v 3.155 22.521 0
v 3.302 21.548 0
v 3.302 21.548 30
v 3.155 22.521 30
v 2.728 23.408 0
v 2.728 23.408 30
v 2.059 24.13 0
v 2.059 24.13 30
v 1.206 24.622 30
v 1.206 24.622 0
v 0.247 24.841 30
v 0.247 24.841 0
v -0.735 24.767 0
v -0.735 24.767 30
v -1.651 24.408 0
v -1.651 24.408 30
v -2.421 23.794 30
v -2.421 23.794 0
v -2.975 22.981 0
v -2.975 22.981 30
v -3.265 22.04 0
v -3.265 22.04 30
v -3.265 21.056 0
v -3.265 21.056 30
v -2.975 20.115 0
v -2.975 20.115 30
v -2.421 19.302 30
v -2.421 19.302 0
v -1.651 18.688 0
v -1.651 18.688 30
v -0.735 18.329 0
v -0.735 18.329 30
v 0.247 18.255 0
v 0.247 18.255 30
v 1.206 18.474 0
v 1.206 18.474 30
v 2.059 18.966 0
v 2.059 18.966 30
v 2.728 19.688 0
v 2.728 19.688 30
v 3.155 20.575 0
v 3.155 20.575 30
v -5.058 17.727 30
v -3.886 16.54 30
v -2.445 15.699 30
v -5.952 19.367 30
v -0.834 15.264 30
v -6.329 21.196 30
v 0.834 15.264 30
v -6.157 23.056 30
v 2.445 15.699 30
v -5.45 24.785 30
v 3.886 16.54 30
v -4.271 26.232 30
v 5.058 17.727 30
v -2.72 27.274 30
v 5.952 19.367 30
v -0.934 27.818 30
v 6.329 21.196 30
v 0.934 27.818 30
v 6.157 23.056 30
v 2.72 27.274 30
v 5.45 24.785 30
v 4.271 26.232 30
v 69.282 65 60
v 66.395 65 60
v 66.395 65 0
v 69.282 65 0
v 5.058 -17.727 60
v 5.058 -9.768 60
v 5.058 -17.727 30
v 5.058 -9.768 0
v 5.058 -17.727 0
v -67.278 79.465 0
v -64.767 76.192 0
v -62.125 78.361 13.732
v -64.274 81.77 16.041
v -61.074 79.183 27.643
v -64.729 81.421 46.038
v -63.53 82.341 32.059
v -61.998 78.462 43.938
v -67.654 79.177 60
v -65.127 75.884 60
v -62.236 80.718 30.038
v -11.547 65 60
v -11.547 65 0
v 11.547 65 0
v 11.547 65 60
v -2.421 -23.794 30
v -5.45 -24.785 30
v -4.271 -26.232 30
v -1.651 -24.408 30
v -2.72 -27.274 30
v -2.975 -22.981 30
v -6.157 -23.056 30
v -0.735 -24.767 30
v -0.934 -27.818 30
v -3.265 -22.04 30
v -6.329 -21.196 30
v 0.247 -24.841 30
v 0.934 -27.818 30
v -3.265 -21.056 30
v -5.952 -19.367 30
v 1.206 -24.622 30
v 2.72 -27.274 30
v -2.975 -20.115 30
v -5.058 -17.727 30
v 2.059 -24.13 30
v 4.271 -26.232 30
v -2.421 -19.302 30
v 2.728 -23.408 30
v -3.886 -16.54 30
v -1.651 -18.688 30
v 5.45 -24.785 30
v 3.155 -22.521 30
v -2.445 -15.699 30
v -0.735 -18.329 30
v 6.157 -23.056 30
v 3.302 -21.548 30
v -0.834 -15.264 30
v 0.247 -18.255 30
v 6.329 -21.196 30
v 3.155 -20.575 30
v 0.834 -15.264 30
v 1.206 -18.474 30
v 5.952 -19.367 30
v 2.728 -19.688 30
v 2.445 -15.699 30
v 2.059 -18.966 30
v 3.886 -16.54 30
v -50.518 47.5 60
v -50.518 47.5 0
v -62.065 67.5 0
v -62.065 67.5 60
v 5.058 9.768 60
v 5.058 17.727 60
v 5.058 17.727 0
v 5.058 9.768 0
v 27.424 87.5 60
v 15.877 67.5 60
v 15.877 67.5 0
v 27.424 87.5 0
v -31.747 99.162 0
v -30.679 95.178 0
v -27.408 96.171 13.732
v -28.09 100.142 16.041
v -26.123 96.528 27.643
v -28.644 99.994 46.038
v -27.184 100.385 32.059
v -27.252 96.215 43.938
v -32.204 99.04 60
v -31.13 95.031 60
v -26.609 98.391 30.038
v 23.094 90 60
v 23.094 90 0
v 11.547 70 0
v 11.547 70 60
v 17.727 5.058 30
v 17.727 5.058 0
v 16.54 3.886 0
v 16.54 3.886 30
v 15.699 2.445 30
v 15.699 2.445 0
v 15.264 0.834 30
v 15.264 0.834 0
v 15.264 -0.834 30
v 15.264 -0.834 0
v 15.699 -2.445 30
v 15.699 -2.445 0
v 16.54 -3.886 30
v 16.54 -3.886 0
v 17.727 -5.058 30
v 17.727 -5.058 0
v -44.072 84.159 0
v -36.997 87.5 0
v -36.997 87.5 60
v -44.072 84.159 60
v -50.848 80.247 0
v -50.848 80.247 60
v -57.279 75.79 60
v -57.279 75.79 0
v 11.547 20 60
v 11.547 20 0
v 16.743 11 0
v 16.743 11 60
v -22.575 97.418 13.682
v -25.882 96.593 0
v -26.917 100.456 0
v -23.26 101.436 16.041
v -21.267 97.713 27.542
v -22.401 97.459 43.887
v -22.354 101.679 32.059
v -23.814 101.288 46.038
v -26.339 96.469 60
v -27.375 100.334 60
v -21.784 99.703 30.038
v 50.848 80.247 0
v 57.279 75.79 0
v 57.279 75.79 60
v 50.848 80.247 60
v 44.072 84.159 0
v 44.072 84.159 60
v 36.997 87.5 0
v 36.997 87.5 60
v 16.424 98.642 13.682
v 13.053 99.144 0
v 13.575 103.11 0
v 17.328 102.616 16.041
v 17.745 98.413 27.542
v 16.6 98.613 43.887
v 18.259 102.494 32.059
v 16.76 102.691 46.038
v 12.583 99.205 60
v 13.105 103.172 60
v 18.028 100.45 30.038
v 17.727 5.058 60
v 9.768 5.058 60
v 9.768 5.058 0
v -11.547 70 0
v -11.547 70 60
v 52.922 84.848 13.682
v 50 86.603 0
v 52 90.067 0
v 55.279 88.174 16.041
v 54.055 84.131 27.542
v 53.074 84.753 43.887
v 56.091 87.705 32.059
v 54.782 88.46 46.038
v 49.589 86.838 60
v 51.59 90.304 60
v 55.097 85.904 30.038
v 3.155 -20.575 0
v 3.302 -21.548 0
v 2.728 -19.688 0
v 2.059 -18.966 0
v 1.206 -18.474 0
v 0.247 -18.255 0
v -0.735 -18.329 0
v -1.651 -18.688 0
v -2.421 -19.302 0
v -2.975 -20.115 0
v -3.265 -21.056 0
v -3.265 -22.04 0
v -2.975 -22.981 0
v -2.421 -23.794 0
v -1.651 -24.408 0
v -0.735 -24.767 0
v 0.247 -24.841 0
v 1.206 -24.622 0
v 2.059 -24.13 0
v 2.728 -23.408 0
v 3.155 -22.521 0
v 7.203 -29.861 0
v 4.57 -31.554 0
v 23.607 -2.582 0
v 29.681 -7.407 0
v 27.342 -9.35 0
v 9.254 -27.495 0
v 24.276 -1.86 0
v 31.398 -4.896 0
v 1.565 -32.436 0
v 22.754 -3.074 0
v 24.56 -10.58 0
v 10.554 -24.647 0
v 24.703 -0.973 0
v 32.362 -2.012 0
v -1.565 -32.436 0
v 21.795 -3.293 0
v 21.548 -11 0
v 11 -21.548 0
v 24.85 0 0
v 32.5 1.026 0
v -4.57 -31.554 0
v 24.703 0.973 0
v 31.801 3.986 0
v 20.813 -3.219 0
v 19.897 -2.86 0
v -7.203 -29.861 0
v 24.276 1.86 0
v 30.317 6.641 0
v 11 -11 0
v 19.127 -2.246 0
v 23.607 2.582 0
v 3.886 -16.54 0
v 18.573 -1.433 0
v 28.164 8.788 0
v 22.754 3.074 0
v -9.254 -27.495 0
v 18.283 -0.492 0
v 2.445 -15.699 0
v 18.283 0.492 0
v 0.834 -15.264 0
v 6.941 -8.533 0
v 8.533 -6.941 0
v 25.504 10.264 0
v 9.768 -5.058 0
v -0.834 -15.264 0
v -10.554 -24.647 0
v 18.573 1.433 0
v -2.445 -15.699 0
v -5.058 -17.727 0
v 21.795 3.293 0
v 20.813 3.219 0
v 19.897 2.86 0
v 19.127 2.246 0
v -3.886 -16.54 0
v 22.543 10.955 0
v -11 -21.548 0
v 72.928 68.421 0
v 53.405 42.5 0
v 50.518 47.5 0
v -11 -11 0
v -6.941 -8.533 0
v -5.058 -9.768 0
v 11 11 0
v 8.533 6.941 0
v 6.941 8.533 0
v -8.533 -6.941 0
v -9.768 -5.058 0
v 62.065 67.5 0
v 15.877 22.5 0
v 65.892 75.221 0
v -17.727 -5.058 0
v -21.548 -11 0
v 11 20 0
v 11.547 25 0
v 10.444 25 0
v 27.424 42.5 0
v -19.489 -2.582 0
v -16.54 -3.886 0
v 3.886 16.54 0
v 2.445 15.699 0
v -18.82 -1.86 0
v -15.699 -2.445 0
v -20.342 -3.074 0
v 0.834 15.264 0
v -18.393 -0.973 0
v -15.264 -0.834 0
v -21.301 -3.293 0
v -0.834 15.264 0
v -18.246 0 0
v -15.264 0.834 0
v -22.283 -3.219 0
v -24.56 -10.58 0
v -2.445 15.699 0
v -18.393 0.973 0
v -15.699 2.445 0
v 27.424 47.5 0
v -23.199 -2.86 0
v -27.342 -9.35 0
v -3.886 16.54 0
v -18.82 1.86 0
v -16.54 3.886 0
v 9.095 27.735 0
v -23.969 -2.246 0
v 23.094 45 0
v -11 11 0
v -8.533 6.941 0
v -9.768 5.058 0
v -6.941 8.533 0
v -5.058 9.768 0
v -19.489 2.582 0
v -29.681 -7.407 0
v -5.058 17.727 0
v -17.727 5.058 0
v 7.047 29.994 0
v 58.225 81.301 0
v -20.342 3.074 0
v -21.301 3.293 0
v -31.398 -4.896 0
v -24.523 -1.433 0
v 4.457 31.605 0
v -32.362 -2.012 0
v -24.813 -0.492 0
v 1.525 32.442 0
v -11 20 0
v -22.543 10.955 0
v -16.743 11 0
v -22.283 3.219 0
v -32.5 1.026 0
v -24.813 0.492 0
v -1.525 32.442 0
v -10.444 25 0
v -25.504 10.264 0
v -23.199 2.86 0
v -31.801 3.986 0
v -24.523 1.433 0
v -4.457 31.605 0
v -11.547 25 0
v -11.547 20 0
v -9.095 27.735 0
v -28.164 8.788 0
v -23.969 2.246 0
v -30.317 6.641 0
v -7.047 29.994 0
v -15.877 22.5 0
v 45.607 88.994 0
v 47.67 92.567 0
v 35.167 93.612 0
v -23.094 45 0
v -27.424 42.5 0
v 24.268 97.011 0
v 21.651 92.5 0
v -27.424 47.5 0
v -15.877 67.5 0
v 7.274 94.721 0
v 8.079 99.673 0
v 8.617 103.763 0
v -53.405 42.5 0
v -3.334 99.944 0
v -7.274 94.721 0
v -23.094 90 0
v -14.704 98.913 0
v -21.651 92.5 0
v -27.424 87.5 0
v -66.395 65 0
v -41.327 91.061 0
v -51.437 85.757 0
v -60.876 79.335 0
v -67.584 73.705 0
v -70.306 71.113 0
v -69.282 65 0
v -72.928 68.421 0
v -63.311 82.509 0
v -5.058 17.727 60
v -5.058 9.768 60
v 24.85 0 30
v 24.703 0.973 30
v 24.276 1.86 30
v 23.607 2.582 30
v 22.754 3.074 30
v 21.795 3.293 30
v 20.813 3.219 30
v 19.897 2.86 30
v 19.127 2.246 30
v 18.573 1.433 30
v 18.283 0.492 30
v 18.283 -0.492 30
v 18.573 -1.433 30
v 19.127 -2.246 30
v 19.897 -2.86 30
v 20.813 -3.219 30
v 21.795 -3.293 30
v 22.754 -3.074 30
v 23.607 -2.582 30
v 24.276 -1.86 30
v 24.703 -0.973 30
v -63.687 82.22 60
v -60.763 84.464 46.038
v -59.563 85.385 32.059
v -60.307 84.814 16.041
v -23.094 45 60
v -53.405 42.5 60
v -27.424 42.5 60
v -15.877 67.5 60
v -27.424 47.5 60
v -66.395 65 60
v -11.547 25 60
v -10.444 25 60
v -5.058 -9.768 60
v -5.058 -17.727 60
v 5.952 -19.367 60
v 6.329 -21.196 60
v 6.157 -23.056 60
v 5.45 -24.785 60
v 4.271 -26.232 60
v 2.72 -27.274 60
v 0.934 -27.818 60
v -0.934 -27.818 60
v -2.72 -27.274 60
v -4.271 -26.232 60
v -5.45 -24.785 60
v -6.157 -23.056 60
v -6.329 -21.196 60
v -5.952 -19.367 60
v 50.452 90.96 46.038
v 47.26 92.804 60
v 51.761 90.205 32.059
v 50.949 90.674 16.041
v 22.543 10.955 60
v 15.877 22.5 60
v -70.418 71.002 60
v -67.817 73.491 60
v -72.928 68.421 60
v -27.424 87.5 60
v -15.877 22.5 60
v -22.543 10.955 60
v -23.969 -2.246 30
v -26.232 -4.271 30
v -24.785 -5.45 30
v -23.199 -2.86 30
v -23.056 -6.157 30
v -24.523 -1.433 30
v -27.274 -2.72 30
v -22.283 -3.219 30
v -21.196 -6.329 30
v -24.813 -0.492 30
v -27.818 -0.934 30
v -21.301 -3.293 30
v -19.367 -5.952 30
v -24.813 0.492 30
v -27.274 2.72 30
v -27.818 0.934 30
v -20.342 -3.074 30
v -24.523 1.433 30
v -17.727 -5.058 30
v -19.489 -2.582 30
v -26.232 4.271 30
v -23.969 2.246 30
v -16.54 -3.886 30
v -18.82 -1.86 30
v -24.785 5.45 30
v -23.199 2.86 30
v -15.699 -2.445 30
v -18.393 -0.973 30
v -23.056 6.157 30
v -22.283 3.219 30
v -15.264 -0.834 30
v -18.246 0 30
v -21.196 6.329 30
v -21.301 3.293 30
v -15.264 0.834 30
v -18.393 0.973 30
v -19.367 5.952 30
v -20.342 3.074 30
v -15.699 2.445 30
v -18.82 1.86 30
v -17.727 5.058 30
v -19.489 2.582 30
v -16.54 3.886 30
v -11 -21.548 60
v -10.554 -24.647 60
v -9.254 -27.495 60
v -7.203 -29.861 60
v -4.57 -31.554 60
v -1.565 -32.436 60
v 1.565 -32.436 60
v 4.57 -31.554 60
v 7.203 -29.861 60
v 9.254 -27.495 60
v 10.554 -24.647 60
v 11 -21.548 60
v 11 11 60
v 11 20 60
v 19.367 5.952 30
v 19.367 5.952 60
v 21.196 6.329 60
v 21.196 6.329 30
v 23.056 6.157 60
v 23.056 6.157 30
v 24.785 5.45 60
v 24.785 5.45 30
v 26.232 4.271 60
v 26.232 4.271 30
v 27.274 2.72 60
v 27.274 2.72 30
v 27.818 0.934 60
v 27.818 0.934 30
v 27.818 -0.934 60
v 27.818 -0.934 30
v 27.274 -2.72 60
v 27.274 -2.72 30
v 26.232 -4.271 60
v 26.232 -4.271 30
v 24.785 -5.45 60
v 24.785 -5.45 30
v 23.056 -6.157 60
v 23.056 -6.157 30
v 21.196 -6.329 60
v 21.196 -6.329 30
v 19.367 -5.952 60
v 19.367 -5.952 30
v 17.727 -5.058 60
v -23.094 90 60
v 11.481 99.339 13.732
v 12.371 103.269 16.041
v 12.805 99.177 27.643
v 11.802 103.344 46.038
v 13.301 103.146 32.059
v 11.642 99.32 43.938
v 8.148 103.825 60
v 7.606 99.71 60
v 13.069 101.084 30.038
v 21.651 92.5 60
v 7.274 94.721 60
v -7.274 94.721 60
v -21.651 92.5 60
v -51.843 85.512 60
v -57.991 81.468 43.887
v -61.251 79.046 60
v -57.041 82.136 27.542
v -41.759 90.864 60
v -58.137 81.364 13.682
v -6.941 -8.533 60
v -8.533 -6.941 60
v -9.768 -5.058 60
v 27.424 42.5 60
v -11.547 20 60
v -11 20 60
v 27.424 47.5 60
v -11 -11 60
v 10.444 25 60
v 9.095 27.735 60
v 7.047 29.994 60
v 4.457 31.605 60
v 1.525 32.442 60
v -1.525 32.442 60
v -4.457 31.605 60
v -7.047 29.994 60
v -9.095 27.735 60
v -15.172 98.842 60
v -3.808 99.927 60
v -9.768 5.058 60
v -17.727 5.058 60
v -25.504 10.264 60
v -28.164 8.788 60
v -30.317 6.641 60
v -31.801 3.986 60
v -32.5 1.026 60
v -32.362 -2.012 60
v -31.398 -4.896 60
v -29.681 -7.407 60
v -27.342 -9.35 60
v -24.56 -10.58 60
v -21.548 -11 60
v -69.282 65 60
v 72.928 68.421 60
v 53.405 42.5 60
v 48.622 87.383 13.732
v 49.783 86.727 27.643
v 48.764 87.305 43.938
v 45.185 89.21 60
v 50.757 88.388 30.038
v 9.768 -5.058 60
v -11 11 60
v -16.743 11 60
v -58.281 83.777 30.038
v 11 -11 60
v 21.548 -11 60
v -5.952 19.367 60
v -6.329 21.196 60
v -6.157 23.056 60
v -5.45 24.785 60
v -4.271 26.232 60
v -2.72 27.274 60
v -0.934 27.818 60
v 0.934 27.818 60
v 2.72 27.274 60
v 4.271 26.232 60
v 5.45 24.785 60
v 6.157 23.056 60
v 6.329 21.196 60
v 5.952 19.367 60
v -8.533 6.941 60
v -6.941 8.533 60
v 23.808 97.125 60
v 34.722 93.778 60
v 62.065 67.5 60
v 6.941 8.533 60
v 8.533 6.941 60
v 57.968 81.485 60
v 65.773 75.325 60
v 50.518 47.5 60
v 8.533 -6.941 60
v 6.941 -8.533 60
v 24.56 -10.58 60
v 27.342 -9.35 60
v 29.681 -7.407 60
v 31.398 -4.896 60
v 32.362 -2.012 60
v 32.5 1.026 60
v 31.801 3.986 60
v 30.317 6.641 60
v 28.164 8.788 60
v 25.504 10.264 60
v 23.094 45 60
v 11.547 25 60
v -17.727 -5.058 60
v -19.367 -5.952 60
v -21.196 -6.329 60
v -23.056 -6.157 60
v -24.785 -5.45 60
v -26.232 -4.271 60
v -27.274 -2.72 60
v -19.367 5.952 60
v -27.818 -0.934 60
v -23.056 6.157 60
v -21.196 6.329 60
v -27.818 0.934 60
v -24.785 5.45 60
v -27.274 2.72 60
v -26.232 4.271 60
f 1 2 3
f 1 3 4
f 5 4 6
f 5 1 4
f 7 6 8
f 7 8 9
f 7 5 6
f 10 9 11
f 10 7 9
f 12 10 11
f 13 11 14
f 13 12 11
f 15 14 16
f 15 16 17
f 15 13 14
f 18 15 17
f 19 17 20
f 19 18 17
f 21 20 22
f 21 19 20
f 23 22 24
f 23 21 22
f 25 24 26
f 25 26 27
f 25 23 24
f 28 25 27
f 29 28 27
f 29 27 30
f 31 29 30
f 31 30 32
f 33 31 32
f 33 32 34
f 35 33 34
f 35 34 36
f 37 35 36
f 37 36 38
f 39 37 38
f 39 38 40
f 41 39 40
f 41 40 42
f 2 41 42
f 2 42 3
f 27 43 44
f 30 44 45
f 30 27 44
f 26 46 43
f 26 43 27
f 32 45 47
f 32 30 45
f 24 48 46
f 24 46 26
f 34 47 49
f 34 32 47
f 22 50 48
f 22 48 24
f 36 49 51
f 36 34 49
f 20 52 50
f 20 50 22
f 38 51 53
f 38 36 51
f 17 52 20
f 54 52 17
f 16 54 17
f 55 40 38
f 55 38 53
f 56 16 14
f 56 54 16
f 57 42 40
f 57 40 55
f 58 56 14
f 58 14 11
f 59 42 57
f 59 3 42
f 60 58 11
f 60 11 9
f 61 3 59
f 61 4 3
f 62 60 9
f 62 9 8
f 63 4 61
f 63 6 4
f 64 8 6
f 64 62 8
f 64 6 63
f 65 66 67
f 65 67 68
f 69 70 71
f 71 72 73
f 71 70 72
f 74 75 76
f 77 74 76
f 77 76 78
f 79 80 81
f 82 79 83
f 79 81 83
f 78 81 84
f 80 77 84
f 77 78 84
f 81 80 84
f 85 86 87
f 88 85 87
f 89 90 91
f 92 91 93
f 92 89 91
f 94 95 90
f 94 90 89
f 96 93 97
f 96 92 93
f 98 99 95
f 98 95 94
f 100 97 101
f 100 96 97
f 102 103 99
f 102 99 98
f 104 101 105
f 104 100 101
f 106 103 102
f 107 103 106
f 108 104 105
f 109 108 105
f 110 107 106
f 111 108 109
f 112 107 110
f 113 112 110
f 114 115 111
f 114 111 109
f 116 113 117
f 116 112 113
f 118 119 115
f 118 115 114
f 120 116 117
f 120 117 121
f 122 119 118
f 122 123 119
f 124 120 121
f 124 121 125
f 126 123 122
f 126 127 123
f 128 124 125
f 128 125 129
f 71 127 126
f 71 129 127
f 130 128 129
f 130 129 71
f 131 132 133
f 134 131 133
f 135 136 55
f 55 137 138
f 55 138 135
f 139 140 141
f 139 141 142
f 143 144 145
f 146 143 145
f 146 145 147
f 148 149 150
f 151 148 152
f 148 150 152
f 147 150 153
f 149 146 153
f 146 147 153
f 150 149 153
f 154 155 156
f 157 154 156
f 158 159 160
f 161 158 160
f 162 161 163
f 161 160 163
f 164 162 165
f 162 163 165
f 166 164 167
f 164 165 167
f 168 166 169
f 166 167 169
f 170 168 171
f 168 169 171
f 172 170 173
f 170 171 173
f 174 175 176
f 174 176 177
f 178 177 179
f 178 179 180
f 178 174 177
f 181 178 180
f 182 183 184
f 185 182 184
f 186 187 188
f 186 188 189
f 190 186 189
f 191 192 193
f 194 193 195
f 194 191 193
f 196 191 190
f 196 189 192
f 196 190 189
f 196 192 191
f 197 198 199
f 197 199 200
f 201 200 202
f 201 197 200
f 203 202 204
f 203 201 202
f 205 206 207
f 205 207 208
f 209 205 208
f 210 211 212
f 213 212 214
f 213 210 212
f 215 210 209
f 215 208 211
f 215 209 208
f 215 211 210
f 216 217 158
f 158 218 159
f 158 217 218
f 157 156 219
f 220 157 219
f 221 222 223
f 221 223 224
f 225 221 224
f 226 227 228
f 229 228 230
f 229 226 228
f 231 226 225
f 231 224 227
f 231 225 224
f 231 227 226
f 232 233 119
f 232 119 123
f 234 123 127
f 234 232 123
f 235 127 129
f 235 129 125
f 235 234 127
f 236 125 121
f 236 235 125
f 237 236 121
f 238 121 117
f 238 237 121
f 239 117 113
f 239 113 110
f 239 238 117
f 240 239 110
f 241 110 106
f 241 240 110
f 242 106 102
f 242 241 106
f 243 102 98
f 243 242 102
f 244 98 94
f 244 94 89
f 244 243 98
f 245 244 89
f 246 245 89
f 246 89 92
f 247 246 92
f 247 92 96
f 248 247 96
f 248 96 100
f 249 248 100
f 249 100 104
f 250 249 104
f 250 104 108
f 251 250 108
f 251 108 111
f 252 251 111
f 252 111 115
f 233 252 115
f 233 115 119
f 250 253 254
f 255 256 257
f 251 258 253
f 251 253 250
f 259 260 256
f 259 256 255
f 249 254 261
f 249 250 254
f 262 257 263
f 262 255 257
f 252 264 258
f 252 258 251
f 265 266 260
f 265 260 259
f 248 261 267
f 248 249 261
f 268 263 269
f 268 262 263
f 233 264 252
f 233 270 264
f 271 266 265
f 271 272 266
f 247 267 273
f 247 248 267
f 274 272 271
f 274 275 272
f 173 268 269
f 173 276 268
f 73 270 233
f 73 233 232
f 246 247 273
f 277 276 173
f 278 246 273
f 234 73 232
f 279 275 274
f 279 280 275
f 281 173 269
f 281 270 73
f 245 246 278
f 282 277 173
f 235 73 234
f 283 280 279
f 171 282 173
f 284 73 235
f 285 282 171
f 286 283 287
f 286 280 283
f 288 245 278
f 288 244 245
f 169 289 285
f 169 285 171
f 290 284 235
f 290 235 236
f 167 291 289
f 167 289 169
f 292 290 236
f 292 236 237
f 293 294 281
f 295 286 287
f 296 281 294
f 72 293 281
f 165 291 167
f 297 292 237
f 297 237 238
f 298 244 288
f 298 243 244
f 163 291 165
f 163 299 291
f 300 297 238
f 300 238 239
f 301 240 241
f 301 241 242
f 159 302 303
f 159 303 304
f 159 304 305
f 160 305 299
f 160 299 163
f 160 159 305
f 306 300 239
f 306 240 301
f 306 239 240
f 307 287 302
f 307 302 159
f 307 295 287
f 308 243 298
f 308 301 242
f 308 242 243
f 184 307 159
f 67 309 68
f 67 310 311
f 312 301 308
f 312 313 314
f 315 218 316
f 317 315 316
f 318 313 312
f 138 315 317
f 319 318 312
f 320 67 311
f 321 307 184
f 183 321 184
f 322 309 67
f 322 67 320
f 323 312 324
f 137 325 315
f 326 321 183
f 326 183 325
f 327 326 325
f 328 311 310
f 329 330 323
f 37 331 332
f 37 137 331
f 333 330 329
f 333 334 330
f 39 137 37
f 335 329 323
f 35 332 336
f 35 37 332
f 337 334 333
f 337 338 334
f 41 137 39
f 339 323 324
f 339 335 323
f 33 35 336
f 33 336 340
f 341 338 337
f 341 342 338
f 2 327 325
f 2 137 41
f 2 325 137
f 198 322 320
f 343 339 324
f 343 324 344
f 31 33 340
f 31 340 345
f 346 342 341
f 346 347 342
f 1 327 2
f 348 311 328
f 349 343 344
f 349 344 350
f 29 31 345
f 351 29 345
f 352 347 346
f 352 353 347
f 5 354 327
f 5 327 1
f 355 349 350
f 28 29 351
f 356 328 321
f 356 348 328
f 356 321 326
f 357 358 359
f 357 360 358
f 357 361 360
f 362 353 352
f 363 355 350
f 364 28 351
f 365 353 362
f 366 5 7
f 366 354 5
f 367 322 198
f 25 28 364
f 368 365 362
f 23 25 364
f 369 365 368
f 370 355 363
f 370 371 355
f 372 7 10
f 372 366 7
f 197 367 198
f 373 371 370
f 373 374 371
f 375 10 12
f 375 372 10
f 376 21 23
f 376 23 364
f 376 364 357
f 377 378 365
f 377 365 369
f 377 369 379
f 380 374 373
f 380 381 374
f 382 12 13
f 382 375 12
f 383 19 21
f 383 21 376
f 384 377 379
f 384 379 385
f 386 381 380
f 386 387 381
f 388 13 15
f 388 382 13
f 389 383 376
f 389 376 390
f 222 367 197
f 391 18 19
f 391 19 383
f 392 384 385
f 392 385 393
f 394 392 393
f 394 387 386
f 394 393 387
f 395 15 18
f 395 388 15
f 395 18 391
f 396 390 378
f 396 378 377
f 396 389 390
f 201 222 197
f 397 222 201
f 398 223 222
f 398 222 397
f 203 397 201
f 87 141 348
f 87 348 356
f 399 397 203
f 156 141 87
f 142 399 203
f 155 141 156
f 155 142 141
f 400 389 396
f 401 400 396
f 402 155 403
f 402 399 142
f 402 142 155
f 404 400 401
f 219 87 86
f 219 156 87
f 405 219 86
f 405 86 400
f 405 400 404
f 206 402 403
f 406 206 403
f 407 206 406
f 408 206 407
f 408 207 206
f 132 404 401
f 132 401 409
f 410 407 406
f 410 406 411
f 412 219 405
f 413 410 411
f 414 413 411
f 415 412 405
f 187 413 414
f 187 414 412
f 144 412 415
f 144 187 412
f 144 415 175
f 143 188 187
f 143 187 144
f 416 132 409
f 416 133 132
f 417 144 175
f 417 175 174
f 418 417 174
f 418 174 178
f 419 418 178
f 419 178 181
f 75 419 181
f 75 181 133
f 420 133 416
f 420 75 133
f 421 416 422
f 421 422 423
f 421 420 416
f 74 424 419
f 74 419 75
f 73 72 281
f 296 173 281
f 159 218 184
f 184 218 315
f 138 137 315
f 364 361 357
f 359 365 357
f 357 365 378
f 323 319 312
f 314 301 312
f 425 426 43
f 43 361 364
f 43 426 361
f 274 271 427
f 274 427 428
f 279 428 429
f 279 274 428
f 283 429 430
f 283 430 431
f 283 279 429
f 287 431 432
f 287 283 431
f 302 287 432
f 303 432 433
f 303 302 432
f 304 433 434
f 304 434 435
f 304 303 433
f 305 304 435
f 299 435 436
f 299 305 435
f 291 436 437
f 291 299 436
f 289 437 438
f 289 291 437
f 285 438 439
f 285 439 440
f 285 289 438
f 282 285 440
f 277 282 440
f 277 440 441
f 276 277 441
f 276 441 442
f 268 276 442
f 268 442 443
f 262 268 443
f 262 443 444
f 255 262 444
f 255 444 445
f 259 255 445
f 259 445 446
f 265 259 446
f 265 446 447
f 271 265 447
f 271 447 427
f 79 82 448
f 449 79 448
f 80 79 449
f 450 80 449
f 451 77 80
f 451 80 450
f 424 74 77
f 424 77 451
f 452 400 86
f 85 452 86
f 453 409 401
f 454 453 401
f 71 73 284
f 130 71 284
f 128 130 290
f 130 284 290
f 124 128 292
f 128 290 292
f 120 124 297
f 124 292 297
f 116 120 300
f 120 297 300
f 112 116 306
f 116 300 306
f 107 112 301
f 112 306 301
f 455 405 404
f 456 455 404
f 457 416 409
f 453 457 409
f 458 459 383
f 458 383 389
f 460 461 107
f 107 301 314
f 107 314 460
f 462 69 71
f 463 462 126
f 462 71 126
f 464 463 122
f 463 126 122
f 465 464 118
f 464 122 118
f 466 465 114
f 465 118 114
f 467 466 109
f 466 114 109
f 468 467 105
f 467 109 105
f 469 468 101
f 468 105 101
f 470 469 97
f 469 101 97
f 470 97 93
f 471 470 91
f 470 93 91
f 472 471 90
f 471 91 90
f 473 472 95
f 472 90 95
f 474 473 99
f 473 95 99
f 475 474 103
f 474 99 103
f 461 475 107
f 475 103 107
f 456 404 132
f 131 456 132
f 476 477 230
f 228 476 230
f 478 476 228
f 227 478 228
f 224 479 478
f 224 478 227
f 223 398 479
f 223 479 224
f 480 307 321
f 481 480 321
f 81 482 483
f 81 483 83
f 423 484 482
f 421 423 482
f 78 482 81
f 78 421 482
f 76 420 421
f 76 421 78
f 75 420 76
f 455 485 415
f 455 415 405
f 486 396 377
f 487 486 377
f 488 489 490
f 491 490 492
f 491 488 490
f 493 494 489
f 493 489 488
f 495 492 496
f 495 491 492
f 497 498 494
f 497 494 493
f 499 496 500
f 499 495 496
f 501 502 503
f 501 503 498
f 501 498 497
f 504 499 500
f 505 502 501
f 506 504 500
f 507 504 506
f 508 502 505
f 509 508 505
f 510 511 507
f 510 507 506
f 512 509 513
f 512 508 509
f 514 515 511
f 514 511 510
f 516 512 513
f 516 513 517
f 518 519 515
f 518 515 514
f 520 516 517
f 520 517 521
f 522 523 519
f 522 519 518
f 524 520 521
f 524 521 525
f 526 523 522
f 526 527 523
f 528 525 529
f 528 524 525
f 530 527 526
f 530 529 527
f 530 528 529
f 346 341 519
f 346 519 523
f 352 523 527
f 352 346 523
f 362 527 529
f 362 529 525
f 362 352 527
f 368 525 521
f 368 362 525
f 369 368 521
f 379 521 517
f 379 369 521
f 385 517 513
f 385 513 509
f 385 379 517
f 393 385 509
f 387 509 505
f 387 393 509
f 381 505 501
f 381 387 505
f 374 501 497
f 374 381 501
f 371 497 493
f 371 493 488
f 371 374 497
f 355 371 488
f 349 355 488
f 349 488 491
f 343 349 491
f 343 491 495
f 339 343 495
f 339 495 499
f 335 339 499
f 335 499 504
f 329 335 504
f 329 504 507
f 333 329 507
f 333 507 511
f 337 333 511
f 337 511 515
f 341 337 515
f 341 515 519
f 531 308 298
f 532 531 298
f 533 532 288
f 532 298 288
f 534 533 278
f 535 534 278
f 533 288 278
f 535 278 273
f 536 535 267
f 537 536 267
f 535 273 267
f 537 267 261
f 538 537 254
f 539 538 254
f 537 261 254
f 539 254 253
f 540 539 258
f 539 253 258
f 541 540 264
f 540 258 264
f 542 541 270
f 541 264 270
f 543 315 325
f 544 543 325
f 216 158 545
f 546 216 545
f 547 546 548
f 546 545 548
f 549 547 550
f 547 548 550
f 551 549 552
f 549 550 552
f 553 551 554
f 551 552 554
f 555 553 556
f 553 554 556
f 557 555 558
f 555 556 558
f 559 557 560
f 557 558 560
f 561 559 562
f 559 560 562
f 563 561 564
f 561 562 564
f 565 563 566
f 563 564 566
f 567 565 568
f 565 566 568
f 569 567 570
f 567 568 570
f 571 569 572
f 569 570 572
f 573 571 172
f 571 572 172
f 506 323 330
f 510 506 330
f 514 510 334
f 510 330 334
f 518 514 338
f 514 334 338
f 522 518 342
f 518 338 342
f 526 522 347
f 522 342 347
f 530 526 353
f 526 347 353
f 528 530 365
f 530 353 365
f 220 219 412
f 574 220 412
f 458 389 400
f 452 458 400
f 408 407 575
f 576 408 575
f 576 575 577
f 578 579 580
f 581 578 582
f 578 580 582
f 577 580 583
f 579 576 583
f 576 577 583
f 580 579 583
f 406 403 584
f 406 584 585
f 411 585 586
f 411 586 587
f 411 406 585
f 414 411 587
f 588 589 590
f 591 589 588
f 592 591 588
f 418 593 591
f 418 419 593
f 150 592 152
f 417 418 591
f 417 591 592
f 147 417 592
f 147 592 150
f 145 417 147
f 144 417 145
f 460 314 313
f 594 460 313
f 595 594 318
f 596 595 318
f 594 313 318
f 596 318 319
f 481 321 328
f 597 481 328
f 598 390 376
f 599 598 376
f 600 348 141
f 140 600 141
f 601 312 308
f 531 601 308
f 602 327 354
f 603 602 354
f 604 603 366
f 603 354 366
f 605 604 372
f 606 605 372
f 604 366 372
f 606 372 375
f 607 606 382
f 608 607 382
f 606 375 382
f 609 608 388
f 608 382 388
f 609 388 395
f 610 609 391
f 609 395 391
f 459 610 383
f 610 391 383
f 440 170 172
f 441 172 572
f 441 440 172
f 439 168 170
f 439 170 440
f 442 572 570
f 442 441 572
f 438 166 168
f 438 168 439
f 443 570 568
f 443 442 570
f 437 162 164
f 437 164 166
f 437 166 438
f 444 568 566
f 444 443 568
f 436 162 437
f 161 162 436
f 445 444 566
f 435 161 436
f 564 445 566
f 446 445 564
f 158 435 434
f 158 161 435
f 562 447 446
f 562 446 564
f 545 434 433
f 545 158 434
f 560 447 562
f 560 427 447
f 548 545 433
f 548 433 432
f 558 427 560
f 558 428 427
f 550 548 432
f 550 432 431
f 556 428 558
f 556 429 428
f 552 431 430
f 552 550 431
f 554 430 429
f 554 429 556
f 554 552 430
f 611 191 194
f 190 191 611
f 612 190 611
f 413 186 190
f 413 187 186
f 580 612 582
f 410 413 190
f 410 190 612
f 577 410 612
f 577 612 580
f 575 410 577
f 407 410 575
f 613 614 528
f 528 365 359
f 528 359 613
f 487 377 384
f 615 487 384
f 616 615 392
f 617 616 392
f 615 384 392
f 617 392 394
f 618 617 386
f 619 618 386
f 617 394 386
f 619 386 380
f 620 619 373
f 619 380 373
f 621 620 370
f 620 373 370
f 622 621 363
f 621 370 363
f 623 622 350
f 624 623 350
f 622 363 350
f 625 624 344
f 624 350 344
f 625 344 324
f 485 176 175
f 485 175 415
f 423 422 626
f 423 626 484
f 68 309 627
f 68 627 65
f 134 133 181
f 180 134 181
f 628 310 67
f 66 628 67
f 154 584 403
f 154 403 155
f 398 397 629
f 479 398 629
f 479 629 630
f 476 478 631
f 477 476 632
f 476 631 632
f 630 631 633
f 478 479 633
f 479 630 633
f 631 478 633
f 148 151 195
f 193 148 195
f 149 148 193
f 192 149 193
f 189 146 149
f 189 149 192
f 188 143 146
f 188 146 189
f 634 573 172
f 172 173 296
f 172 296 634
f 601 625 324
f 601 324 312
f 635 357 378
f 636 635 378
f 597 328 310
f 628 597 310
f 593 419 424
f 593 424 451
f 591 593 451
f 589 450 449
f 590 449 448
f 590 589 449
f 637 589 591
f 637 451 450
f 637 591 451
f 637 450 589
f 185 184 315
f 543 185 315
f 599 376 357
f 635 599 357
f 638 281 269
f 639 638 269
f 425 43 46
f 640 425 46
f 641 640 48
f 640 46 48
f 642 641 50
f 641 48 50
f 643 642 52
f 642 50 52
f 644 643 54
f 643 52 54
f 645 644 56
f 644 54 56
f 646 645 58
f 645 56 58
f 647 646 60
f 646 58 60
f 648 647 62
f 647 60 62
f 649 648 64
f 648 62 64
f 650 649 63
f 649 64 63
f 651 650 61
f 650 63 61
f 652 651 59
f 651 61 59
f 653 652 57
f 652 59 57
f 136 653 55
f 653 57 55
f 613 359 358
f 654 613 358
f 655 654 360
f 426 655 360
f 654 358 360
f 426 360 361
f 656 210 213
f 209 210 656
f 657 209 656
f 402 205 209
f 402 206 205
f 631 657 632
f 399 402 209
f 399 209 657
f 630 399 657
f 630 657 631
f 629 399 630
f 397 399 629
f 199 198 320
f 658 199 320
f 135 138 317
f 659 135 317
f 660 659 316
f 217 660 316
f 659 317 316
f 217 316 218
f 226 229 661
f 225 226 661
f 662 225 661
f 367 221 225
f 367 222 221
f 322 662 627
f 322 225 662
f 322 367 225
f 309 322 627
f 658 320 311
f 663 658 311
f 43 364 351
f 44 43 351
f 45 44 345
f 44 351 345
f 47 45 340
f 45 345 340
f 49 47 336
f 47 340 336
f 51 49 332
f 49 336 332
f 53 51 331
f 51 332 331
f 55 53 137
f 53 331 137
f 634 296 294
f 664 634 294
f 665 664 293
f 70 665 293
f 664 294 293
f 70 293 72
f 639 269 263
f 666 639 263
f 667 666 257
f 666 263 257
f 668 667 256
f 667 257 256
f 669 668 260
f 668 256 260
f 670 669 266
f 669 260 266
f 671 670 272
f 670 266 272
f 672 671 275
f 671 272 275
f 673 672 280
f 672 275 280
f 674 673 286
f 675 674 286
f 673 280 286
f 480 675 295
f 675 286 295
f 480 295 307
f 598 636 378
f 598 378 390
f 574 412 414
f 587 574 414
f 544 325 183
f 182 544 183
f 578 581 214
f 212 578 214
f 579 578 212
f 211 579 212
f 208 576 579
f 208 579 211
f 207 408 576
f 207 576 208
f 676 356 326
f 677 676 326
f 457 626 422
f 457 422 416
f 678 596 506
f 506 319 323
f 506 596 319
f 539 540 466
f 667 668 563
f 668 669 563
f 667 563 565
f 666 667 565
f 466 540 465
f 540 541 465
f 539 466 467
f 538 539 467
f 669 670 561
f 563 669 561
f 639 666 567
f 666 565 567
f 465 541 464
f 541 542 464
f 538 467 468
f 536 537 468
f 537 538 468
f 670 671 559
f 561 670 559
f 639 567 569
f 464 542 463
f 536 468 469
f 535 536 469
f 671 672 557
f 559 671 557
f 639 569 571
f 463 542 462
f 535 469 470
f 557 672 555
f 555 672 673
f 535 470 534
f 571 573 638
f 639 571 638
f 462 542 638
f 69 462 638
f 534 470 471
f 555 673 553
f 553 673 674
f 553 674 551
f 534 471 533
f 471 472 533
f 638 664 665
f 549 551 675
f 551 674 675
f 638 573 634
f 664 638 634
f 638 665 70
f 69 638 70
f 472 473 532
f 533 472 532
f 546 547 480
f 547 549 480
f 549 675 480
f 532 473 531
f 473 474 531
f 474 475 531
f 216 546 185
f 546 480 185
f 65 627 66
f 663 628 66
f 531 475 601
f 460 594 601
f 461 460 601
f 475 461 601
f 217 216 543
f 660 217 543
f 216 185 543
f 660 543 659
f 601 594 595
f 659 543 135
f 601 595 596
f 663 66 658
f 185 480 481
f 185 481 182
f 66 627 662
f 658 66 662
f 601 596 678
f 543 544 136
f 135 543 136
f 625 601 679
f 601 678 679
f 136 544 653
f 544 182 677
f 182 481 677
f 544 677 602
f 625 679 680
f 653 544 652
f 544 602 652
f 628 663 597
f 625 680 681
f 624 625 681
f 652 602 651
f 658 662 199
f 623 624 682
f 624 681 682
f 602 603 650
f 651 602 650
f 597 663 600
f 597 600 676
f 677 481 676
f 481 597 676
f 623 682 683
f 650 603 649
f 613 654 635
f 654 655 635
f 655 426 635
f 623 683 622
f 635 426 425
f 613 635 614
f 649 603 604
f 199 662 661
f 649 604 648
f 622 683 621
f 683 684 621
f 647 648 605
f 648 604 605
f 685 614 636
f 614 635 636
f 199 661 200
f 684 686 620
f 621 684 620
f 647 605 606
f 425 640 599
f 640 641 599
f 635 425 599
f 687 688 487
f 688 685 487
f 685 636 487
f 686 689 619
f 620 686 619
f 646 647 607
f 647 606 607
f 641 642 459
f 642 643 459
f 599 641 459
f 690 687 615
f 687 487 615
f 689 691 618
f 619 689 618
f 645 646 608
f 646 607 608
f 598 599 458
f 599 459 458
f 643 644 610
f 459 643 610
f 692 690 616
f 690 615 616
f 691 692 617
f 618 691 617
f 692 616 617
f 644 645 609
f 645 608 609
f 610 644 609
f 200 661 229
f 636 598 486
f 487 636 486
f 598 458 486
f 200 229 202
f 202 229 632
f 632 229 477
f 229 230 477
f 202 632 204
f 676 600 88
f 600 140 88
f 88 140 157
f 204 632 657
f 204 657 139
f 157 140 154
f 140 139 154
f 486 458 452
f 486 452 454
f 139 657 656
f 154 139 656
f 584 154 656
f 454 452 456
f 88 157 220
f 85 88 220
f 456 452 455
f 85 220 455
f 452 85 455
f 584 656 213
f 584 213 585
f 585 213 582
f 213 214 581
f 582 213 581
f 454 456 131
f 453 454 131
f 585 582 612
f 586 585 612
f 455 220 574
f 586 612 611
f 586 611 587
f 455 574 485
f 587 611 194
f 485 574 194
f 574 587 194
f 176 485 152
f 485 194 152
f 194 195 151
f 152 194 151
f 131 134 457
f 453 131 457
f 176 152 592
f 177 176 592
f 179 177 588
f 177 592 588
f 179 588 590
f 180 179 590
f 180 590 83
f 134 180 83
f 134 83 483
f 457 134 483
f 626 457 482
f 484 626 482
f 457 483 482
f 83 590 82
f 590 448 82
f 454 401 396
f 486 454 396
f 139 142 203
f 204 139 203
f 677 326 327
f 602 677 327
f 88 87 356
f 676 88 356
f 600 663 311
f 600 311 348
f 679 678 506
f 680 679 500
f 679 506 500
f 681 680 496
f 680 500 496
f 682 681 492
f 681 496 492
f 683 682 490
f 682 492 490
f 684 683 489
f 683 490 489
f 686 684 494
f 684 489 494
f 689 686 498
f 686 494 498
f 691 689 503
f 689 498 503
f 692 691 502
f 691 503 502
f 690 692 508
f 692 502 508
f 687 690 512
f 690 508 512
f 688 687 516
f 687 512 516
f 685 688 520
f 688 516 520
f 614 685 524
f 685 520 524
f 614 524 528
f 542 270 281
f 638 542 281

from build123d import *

# Parameters (mm, degrees)
BOSS_EXTRUDE1_DEPTH = 60
SKETCH1_4_R         = 6.338999997
SKETCH1_4_R_2       = 3.302
SKETCH1_4_R_3       = 3.301999997
BOSS_EXTRUDE2_DEPTH = 10
SKETCH1_6_R         = 6.338999997
SKETCH1_6_R_2       = 3.301999997
SKETCH1_6_R_3       = 3.302
BOSS_EXTRUDE4_DEPTH = 30
BOSS_EXTRUDE5_DEPTH = 60
BOSS_EXTRUDE6_START = -2
BOSS_EXTRUDE6_DEPTH = 6
CIRPATTERN3_COUNT   = 16


# Read off the part's stored shape, not the designer's step: Boss-Extrude1
with BuildPart() as part:
    # Boss-Extrude1 outline → Boss-Extrude1 (new body)
    with BuildSketch(Plane.XY):
        with BuildLine():
            Line((-27.424137764, 42.49999995), (-15.877132386, 22.499999959))
            Line((-15.877132386, 22.499999959), (-22.542678391, 10.954935617))
            ThreePointArc((-22.542678391, 10.954935617), (-32.536728065, -0.49784941), (-21.547999925, -11.00000003))
            Line((-21.547999925, -11.00000003), (-10.999999983, -11.00000003))
            Line((-10.999999983, -11.00000003), (-10.999999983, -21.547999949))
            ThreePointArc((-10.999999983, -21.547999949), (2.4e-08, -32.547999956), (11.00000003, -21.547999949))
            Line((11.00000003, -21.547999949), (11.00000003, -11.000000006))
            Line((11.00000003, -11.000000006), (21.547999949, -11.000000006))
            ThreePointArc((21.547999949, -11.000000006), (32.53672809, -0.497849376), (22.542678394, 10.954935643))
            Line((22.542678394, 10.954935643), (15.877132386, 22.499999959))
            Line((15.877132386, 22.499999959), (27.424137764, 42.49999995))
            Line((27.424137764, 42.49999995), (53.404899911, 42.49999995))
            Line((53.404899911, 42.49999995), (66.39528096, 64.999999935))
            Line((66.39528096, 64.999999935), (69.282032276, 65.000000028))
            ThreePointArc((69.282032276, 65.000000028), (63.510032668, 70.650376861), (57.278911905, 75.79001419))
            Line((57.278911905, 75.79001419), (62.0651539, 67.499999879))
            Line((62.0651539, 67.499999879), (50.518148521, 47.499999888))
            Line((50.518148521, 47.499999888), (27.42413776, 47.499999896))
            Line((27.42413776, 47.499999896), (15.877132386, 67.499999879))
            Line((15.877132386, 67.499999879), (27.424137764, 87.49999987))
            Line((27.424137764, 87.49999987), (36.996621947, 87.499999797))
            ThreePointArc((36.996621947, 87.499999797), (29.430004911, 90.326490085), (21.650635056, 92.500000009))
            Line((21.650635056, 92.500000009), (23.094010837, 89.999999729))
            Line((23.094010837, 89.999999729), (11.547005507, 69.999999822))
            Line((11.547005507, 69.999999822), (-11.547004687, 69.999999822))
            Line((-11.547004687, 69.999999822), (-23.094010614, 89.999999911))
            Line((-23.094010614, 89.999999911), (-21.650634856, 92.500000056))
            ThreePointArc((-21.650634856, 92.500000056), (-29.430004813, 90.326490116), (-36.996621947, 87.499999797))
            Line((-36.996621947, 87.499999797), (-27.424137764, 87.49999987))
            Line((-27.424137764, 87.49999987), (-15.877132386, 67.499999879))
            Line((-15.877132386, 67.499999879), (-27.424137764, 47.499999888))
            Line((-27.424137764, 47.499999888), (-50.518148521, 47.499999888))
            Line((-50.518148521, 47.499999888), (-62.0651539, 67.499999879))
            Line((-62.0651539, 67.499999879), (-57.278911905, 75.79001419))
            ThreePointArc((-57.278911905, 75.79001419), (-63.510032668, 70.650376861), (-69.282032276, 65.000000028))
            Line((-69.282032276, 65.000000028), (-66.39528096, 64.999999935))
            Line((-66.39528096, 64.999999935), (-53.404899911, 42.49999995))
            Line((-53.404899911, 42.49999995), (-27.424137764, 42.49999995))
        make_face()
        Polygon((-11.000000006, 19.999999941), (-11.000000006, 10.999999983), (-16.743157748, 10.999999983), (-11.54700535, 19.999999941), align=None, mode=Mode.SUBTRACT)
        with BuildLine():
            Line((-9.767988869, -5.058299477), (-17.727459778, -5.058299515))
            ThreePointArc((-17.727459778, -5.058299515), (-27.88699994, -4.1e-08), (-17.727459815, 5.058299508))
            Line((-17.727459815, 5.058299508), (-9.767988835, 5.058299543))
            ThreePointArc((-9.767988835, 5.058299543), (-7.778174571, 7.778174624), (-5.058299477, 9.767988869))
            Line((-5.058299477, 9.767988869), (-5.058299513, 17.727459781))
            ThreePointArc((-5.058299513, 17.727459781), (-1.2e-08, 27.886999922), (5.058299528, 17.7274598))
            Line((5.058299528, 17.7274598), (5.058299543, 9.767988835))
            ThreePointArc((5.058299543, 9.767988835), (7.778174624, 7.778174571), (9.767988869, 5.058299477))
            Line((9.767988869, 5.058299477), (17.727459795, 5.058299493))
            ThreePointArc((17.727459795, 5.058299493), (27.88699994, -1.5e-08), (17.727459798, -5.05829953))
            Line((17.727459798, -5.05829953), (9.767988835, -5.058299543))
            ThreePointArc((9.767988835, -5.058299543), (7.778174571, -7.778174624), (5.058299477, -9.767988869))
            Line((5.058299477, -9.767988869), (5.058299496, -17.727459793))
            ThreePointArc((5.058299496, -17.727459793), (1.3e-08, -27.886999957), (-5.058299511, -17.727459813))
            Line((-5.058299511, -17.727459813), (-5.058299543, -9.767988835))
            ThreePointArc((-5.058299543, -9.767988835), (-7.778174624, -7.778174571), (-9.767988869, -5.058299477))
        make_face(mode=Mode.SUBTRACT)
        Polygon((16.743157694, 11.000000006), (11.000000006, 11.000000006), (11.000000006, 19.999999941), (11.54700535, 19.999999941), align=None, mode=Mode.SUBTRACT)
        with BuildLine():
            Line((23.094010708, 44.999999885), (11.547005356, 24.999999941))
            Line((11.547005356, 24.999999941), (10.444314053, 24.999999941))
            ThreePointArc((10.444314053, 24.999999941), (0, 32.547999932), (-10.444314053, 24.999999941))
            Line((-10.444314053, 24.999999941), (-11.547005099, 24.999999941))
            Line((-11.547005099, 24.999999941), (-23.094010665, 44.999999941))
            Line((-23.094010665, 44.999999941), (-11.54700535, 64.999999822))
            Line((-11.54700535, 64.999999822), (11.54700535, 64.999999822))
            Line((11.54700535, 64.999999822), (23.094010708, 44.999999885))
        make_face(mode=Mode.SUBTRACT)
    extrude(amount=BOSS_EXTRUDE1_DEPTH)

    # Sketch1<4> → Boss-Extrude2 (add)
    # profile 1 of 4: a face of its own
    with BuildSketch(Plane.XY):
        with Locations((0, 21.547999925)):
            Circle(SKETCH1_4_R)
        with Locations((0, 21.547999925)):
            Circle(SKETCH1_4_R_2, mode=Mode.SUBTRACT)
    # profile 2 of 4: a face of its own
    with BuildSketch(Plane.XY):
        with Locations((21.547999943, -1.7e-08)):
            Circle(SKETCH1_4_R)
        with Locations((21.547999974, -2.6e-08)):
            Circle(SKETCH1_4_R_2, mode=Mode.SUBTRACT)
    # profile 3 of 4: a face of its own
    with BuildSketch(Plane.XY):
        with Locations((-21.547999943, -1.7e-08)):
            Circle(SKETCH1_4_R)
        with Locations((-21.547999951, -4.8e-08)):
            Circle(SKETCH1_4_R_2, mode=Mode.SUBTRACT)
    # profile 4 of 4: a face of its own
    with BuildSketch(Plane.XY):
        with Locations((0, -21.54799996)):
            Circle(SKETCH1_4_R)
        with Locations((2.3e-08, -21.547999999)):
            Circle(SKETCH1_4_R_3, mode=Mode.SUBTRACT)
    extrude(amount=BOSS_EXTRUDE2_DEPTH)

    # Sketch1<6> → Boss-Extrude4 (add)
    # profile 1 of 4: a face of its own
    with BuildSketch(Plane.XY):
        with Locations((0, -21.54799996)):
            Circle(SKETCH1_6_R)
        with Locations((2.3e-08, -21.547999999)):
            Circle(SKETCH1_6_R_2, mode=Mode.SUBTRACT)
    # profile 2 of 4: a face of its own
    with BuildSketch(Plane.XY):
        with Locations((-21.547999943, -1.7e-08)):
            Circle(SKETCH1_6_R)
        with Locations((-21.547999951, -4.8e-08)):
            Circle(SKETCH1_6_R_3, mode=Mode.SUBTRACT)
    # profile 3 of 4: a face of its own
    with BuildSketch(Plane.XY):
        with Locations((21.547999943, -1.7e-08)):
            Circle(SKETCH1_6_R)
        with Locations((21.547999974, -2.6e-08)):
            Circle(SKETCH1_6_R_3, mode=Mode.SUBTRACT)
    # profile 4 of 4: a face of its own
    with BuildSketch(Plane.XY):
        with Locations((0, 21.547999925)):
            Circle(SKETCH1_6_R)
        with Locations((0, 21.547999925)):
            Circle(SKETCH1_6_R_3, mode=Mode.SUBTRACT)
    extrude(amount=BOSS_EXTRUDE4_DEPTH)

    # Sketch1<7> → Boss-Extrude5 (add)
    with BuildSketch(Plane.XY):
        with BuildLine():
            Line((-69.282032276, 65.000000028), (-72.928455025, 68.421052659))
            ThreePointArc((-72.928455025, 68.421052659), (0, 99.999999996), (72.928455025, 68.421052659))
            Line((72.928455025, 68.421052659), (69.282032276, 65.000000028))
            ThreePointArc((69.282032276, 65.000000028), (0, 95), (-69.282032276, 65.000000028))
        make_face()
    extrude(amount=BOSS_EXTRUDE5_DEPTH)

    # Sketch2 → Boss-Extrude6 (add)
    with BuildSketch(Plane(origin=(49.999999998, 86.602540375, 0), x_dir=(0.866025403784439, -0.4999999999999993, 0), z_dir=(0.4999999999999993, 0.866025403784439, 0)).offset(BOSS_EXTRUDE6_START)):
        with BuildLine():
            Line((0, 0), (-5, 0))
            add(Edge.make_bspline(
                [(-5, 0), (4.762549661, -30.076815137), (-5.473720523, -60)],
                knots=[0, 0, 0, 1, 1, 1], degree=2))
            Line((-5.473720523, -60), (-0.473720523, -60))
            add(Edge.make_bspline(
                [(0, 0), (9.762549647, -30.076815137), (-0.473720523, -60)],
                knots=[0, 0, 0, 1, 1, 1], degree=2))
        make_face()
    boss_extrude6 = extrude(amount=BOSS_EXTRUDE6_DEPTH)

    # CirPattern3: Boss-Extrude6 ×16 about axis, 12 skipped
    cirpattern3_axis = Axis((0, 0, 0), (0, 0, -1))
    add([boss_extrude6.rotate(cirpattern3_axis, i * 360 / CIRPATTERN3_COUNT) for i in range(1, CIRPATTERN3_COUNT) if i not in (1, 2, 3, 4, 5, 6, 7, 8, 9, 10, 11, 12)])


solid = part.part
